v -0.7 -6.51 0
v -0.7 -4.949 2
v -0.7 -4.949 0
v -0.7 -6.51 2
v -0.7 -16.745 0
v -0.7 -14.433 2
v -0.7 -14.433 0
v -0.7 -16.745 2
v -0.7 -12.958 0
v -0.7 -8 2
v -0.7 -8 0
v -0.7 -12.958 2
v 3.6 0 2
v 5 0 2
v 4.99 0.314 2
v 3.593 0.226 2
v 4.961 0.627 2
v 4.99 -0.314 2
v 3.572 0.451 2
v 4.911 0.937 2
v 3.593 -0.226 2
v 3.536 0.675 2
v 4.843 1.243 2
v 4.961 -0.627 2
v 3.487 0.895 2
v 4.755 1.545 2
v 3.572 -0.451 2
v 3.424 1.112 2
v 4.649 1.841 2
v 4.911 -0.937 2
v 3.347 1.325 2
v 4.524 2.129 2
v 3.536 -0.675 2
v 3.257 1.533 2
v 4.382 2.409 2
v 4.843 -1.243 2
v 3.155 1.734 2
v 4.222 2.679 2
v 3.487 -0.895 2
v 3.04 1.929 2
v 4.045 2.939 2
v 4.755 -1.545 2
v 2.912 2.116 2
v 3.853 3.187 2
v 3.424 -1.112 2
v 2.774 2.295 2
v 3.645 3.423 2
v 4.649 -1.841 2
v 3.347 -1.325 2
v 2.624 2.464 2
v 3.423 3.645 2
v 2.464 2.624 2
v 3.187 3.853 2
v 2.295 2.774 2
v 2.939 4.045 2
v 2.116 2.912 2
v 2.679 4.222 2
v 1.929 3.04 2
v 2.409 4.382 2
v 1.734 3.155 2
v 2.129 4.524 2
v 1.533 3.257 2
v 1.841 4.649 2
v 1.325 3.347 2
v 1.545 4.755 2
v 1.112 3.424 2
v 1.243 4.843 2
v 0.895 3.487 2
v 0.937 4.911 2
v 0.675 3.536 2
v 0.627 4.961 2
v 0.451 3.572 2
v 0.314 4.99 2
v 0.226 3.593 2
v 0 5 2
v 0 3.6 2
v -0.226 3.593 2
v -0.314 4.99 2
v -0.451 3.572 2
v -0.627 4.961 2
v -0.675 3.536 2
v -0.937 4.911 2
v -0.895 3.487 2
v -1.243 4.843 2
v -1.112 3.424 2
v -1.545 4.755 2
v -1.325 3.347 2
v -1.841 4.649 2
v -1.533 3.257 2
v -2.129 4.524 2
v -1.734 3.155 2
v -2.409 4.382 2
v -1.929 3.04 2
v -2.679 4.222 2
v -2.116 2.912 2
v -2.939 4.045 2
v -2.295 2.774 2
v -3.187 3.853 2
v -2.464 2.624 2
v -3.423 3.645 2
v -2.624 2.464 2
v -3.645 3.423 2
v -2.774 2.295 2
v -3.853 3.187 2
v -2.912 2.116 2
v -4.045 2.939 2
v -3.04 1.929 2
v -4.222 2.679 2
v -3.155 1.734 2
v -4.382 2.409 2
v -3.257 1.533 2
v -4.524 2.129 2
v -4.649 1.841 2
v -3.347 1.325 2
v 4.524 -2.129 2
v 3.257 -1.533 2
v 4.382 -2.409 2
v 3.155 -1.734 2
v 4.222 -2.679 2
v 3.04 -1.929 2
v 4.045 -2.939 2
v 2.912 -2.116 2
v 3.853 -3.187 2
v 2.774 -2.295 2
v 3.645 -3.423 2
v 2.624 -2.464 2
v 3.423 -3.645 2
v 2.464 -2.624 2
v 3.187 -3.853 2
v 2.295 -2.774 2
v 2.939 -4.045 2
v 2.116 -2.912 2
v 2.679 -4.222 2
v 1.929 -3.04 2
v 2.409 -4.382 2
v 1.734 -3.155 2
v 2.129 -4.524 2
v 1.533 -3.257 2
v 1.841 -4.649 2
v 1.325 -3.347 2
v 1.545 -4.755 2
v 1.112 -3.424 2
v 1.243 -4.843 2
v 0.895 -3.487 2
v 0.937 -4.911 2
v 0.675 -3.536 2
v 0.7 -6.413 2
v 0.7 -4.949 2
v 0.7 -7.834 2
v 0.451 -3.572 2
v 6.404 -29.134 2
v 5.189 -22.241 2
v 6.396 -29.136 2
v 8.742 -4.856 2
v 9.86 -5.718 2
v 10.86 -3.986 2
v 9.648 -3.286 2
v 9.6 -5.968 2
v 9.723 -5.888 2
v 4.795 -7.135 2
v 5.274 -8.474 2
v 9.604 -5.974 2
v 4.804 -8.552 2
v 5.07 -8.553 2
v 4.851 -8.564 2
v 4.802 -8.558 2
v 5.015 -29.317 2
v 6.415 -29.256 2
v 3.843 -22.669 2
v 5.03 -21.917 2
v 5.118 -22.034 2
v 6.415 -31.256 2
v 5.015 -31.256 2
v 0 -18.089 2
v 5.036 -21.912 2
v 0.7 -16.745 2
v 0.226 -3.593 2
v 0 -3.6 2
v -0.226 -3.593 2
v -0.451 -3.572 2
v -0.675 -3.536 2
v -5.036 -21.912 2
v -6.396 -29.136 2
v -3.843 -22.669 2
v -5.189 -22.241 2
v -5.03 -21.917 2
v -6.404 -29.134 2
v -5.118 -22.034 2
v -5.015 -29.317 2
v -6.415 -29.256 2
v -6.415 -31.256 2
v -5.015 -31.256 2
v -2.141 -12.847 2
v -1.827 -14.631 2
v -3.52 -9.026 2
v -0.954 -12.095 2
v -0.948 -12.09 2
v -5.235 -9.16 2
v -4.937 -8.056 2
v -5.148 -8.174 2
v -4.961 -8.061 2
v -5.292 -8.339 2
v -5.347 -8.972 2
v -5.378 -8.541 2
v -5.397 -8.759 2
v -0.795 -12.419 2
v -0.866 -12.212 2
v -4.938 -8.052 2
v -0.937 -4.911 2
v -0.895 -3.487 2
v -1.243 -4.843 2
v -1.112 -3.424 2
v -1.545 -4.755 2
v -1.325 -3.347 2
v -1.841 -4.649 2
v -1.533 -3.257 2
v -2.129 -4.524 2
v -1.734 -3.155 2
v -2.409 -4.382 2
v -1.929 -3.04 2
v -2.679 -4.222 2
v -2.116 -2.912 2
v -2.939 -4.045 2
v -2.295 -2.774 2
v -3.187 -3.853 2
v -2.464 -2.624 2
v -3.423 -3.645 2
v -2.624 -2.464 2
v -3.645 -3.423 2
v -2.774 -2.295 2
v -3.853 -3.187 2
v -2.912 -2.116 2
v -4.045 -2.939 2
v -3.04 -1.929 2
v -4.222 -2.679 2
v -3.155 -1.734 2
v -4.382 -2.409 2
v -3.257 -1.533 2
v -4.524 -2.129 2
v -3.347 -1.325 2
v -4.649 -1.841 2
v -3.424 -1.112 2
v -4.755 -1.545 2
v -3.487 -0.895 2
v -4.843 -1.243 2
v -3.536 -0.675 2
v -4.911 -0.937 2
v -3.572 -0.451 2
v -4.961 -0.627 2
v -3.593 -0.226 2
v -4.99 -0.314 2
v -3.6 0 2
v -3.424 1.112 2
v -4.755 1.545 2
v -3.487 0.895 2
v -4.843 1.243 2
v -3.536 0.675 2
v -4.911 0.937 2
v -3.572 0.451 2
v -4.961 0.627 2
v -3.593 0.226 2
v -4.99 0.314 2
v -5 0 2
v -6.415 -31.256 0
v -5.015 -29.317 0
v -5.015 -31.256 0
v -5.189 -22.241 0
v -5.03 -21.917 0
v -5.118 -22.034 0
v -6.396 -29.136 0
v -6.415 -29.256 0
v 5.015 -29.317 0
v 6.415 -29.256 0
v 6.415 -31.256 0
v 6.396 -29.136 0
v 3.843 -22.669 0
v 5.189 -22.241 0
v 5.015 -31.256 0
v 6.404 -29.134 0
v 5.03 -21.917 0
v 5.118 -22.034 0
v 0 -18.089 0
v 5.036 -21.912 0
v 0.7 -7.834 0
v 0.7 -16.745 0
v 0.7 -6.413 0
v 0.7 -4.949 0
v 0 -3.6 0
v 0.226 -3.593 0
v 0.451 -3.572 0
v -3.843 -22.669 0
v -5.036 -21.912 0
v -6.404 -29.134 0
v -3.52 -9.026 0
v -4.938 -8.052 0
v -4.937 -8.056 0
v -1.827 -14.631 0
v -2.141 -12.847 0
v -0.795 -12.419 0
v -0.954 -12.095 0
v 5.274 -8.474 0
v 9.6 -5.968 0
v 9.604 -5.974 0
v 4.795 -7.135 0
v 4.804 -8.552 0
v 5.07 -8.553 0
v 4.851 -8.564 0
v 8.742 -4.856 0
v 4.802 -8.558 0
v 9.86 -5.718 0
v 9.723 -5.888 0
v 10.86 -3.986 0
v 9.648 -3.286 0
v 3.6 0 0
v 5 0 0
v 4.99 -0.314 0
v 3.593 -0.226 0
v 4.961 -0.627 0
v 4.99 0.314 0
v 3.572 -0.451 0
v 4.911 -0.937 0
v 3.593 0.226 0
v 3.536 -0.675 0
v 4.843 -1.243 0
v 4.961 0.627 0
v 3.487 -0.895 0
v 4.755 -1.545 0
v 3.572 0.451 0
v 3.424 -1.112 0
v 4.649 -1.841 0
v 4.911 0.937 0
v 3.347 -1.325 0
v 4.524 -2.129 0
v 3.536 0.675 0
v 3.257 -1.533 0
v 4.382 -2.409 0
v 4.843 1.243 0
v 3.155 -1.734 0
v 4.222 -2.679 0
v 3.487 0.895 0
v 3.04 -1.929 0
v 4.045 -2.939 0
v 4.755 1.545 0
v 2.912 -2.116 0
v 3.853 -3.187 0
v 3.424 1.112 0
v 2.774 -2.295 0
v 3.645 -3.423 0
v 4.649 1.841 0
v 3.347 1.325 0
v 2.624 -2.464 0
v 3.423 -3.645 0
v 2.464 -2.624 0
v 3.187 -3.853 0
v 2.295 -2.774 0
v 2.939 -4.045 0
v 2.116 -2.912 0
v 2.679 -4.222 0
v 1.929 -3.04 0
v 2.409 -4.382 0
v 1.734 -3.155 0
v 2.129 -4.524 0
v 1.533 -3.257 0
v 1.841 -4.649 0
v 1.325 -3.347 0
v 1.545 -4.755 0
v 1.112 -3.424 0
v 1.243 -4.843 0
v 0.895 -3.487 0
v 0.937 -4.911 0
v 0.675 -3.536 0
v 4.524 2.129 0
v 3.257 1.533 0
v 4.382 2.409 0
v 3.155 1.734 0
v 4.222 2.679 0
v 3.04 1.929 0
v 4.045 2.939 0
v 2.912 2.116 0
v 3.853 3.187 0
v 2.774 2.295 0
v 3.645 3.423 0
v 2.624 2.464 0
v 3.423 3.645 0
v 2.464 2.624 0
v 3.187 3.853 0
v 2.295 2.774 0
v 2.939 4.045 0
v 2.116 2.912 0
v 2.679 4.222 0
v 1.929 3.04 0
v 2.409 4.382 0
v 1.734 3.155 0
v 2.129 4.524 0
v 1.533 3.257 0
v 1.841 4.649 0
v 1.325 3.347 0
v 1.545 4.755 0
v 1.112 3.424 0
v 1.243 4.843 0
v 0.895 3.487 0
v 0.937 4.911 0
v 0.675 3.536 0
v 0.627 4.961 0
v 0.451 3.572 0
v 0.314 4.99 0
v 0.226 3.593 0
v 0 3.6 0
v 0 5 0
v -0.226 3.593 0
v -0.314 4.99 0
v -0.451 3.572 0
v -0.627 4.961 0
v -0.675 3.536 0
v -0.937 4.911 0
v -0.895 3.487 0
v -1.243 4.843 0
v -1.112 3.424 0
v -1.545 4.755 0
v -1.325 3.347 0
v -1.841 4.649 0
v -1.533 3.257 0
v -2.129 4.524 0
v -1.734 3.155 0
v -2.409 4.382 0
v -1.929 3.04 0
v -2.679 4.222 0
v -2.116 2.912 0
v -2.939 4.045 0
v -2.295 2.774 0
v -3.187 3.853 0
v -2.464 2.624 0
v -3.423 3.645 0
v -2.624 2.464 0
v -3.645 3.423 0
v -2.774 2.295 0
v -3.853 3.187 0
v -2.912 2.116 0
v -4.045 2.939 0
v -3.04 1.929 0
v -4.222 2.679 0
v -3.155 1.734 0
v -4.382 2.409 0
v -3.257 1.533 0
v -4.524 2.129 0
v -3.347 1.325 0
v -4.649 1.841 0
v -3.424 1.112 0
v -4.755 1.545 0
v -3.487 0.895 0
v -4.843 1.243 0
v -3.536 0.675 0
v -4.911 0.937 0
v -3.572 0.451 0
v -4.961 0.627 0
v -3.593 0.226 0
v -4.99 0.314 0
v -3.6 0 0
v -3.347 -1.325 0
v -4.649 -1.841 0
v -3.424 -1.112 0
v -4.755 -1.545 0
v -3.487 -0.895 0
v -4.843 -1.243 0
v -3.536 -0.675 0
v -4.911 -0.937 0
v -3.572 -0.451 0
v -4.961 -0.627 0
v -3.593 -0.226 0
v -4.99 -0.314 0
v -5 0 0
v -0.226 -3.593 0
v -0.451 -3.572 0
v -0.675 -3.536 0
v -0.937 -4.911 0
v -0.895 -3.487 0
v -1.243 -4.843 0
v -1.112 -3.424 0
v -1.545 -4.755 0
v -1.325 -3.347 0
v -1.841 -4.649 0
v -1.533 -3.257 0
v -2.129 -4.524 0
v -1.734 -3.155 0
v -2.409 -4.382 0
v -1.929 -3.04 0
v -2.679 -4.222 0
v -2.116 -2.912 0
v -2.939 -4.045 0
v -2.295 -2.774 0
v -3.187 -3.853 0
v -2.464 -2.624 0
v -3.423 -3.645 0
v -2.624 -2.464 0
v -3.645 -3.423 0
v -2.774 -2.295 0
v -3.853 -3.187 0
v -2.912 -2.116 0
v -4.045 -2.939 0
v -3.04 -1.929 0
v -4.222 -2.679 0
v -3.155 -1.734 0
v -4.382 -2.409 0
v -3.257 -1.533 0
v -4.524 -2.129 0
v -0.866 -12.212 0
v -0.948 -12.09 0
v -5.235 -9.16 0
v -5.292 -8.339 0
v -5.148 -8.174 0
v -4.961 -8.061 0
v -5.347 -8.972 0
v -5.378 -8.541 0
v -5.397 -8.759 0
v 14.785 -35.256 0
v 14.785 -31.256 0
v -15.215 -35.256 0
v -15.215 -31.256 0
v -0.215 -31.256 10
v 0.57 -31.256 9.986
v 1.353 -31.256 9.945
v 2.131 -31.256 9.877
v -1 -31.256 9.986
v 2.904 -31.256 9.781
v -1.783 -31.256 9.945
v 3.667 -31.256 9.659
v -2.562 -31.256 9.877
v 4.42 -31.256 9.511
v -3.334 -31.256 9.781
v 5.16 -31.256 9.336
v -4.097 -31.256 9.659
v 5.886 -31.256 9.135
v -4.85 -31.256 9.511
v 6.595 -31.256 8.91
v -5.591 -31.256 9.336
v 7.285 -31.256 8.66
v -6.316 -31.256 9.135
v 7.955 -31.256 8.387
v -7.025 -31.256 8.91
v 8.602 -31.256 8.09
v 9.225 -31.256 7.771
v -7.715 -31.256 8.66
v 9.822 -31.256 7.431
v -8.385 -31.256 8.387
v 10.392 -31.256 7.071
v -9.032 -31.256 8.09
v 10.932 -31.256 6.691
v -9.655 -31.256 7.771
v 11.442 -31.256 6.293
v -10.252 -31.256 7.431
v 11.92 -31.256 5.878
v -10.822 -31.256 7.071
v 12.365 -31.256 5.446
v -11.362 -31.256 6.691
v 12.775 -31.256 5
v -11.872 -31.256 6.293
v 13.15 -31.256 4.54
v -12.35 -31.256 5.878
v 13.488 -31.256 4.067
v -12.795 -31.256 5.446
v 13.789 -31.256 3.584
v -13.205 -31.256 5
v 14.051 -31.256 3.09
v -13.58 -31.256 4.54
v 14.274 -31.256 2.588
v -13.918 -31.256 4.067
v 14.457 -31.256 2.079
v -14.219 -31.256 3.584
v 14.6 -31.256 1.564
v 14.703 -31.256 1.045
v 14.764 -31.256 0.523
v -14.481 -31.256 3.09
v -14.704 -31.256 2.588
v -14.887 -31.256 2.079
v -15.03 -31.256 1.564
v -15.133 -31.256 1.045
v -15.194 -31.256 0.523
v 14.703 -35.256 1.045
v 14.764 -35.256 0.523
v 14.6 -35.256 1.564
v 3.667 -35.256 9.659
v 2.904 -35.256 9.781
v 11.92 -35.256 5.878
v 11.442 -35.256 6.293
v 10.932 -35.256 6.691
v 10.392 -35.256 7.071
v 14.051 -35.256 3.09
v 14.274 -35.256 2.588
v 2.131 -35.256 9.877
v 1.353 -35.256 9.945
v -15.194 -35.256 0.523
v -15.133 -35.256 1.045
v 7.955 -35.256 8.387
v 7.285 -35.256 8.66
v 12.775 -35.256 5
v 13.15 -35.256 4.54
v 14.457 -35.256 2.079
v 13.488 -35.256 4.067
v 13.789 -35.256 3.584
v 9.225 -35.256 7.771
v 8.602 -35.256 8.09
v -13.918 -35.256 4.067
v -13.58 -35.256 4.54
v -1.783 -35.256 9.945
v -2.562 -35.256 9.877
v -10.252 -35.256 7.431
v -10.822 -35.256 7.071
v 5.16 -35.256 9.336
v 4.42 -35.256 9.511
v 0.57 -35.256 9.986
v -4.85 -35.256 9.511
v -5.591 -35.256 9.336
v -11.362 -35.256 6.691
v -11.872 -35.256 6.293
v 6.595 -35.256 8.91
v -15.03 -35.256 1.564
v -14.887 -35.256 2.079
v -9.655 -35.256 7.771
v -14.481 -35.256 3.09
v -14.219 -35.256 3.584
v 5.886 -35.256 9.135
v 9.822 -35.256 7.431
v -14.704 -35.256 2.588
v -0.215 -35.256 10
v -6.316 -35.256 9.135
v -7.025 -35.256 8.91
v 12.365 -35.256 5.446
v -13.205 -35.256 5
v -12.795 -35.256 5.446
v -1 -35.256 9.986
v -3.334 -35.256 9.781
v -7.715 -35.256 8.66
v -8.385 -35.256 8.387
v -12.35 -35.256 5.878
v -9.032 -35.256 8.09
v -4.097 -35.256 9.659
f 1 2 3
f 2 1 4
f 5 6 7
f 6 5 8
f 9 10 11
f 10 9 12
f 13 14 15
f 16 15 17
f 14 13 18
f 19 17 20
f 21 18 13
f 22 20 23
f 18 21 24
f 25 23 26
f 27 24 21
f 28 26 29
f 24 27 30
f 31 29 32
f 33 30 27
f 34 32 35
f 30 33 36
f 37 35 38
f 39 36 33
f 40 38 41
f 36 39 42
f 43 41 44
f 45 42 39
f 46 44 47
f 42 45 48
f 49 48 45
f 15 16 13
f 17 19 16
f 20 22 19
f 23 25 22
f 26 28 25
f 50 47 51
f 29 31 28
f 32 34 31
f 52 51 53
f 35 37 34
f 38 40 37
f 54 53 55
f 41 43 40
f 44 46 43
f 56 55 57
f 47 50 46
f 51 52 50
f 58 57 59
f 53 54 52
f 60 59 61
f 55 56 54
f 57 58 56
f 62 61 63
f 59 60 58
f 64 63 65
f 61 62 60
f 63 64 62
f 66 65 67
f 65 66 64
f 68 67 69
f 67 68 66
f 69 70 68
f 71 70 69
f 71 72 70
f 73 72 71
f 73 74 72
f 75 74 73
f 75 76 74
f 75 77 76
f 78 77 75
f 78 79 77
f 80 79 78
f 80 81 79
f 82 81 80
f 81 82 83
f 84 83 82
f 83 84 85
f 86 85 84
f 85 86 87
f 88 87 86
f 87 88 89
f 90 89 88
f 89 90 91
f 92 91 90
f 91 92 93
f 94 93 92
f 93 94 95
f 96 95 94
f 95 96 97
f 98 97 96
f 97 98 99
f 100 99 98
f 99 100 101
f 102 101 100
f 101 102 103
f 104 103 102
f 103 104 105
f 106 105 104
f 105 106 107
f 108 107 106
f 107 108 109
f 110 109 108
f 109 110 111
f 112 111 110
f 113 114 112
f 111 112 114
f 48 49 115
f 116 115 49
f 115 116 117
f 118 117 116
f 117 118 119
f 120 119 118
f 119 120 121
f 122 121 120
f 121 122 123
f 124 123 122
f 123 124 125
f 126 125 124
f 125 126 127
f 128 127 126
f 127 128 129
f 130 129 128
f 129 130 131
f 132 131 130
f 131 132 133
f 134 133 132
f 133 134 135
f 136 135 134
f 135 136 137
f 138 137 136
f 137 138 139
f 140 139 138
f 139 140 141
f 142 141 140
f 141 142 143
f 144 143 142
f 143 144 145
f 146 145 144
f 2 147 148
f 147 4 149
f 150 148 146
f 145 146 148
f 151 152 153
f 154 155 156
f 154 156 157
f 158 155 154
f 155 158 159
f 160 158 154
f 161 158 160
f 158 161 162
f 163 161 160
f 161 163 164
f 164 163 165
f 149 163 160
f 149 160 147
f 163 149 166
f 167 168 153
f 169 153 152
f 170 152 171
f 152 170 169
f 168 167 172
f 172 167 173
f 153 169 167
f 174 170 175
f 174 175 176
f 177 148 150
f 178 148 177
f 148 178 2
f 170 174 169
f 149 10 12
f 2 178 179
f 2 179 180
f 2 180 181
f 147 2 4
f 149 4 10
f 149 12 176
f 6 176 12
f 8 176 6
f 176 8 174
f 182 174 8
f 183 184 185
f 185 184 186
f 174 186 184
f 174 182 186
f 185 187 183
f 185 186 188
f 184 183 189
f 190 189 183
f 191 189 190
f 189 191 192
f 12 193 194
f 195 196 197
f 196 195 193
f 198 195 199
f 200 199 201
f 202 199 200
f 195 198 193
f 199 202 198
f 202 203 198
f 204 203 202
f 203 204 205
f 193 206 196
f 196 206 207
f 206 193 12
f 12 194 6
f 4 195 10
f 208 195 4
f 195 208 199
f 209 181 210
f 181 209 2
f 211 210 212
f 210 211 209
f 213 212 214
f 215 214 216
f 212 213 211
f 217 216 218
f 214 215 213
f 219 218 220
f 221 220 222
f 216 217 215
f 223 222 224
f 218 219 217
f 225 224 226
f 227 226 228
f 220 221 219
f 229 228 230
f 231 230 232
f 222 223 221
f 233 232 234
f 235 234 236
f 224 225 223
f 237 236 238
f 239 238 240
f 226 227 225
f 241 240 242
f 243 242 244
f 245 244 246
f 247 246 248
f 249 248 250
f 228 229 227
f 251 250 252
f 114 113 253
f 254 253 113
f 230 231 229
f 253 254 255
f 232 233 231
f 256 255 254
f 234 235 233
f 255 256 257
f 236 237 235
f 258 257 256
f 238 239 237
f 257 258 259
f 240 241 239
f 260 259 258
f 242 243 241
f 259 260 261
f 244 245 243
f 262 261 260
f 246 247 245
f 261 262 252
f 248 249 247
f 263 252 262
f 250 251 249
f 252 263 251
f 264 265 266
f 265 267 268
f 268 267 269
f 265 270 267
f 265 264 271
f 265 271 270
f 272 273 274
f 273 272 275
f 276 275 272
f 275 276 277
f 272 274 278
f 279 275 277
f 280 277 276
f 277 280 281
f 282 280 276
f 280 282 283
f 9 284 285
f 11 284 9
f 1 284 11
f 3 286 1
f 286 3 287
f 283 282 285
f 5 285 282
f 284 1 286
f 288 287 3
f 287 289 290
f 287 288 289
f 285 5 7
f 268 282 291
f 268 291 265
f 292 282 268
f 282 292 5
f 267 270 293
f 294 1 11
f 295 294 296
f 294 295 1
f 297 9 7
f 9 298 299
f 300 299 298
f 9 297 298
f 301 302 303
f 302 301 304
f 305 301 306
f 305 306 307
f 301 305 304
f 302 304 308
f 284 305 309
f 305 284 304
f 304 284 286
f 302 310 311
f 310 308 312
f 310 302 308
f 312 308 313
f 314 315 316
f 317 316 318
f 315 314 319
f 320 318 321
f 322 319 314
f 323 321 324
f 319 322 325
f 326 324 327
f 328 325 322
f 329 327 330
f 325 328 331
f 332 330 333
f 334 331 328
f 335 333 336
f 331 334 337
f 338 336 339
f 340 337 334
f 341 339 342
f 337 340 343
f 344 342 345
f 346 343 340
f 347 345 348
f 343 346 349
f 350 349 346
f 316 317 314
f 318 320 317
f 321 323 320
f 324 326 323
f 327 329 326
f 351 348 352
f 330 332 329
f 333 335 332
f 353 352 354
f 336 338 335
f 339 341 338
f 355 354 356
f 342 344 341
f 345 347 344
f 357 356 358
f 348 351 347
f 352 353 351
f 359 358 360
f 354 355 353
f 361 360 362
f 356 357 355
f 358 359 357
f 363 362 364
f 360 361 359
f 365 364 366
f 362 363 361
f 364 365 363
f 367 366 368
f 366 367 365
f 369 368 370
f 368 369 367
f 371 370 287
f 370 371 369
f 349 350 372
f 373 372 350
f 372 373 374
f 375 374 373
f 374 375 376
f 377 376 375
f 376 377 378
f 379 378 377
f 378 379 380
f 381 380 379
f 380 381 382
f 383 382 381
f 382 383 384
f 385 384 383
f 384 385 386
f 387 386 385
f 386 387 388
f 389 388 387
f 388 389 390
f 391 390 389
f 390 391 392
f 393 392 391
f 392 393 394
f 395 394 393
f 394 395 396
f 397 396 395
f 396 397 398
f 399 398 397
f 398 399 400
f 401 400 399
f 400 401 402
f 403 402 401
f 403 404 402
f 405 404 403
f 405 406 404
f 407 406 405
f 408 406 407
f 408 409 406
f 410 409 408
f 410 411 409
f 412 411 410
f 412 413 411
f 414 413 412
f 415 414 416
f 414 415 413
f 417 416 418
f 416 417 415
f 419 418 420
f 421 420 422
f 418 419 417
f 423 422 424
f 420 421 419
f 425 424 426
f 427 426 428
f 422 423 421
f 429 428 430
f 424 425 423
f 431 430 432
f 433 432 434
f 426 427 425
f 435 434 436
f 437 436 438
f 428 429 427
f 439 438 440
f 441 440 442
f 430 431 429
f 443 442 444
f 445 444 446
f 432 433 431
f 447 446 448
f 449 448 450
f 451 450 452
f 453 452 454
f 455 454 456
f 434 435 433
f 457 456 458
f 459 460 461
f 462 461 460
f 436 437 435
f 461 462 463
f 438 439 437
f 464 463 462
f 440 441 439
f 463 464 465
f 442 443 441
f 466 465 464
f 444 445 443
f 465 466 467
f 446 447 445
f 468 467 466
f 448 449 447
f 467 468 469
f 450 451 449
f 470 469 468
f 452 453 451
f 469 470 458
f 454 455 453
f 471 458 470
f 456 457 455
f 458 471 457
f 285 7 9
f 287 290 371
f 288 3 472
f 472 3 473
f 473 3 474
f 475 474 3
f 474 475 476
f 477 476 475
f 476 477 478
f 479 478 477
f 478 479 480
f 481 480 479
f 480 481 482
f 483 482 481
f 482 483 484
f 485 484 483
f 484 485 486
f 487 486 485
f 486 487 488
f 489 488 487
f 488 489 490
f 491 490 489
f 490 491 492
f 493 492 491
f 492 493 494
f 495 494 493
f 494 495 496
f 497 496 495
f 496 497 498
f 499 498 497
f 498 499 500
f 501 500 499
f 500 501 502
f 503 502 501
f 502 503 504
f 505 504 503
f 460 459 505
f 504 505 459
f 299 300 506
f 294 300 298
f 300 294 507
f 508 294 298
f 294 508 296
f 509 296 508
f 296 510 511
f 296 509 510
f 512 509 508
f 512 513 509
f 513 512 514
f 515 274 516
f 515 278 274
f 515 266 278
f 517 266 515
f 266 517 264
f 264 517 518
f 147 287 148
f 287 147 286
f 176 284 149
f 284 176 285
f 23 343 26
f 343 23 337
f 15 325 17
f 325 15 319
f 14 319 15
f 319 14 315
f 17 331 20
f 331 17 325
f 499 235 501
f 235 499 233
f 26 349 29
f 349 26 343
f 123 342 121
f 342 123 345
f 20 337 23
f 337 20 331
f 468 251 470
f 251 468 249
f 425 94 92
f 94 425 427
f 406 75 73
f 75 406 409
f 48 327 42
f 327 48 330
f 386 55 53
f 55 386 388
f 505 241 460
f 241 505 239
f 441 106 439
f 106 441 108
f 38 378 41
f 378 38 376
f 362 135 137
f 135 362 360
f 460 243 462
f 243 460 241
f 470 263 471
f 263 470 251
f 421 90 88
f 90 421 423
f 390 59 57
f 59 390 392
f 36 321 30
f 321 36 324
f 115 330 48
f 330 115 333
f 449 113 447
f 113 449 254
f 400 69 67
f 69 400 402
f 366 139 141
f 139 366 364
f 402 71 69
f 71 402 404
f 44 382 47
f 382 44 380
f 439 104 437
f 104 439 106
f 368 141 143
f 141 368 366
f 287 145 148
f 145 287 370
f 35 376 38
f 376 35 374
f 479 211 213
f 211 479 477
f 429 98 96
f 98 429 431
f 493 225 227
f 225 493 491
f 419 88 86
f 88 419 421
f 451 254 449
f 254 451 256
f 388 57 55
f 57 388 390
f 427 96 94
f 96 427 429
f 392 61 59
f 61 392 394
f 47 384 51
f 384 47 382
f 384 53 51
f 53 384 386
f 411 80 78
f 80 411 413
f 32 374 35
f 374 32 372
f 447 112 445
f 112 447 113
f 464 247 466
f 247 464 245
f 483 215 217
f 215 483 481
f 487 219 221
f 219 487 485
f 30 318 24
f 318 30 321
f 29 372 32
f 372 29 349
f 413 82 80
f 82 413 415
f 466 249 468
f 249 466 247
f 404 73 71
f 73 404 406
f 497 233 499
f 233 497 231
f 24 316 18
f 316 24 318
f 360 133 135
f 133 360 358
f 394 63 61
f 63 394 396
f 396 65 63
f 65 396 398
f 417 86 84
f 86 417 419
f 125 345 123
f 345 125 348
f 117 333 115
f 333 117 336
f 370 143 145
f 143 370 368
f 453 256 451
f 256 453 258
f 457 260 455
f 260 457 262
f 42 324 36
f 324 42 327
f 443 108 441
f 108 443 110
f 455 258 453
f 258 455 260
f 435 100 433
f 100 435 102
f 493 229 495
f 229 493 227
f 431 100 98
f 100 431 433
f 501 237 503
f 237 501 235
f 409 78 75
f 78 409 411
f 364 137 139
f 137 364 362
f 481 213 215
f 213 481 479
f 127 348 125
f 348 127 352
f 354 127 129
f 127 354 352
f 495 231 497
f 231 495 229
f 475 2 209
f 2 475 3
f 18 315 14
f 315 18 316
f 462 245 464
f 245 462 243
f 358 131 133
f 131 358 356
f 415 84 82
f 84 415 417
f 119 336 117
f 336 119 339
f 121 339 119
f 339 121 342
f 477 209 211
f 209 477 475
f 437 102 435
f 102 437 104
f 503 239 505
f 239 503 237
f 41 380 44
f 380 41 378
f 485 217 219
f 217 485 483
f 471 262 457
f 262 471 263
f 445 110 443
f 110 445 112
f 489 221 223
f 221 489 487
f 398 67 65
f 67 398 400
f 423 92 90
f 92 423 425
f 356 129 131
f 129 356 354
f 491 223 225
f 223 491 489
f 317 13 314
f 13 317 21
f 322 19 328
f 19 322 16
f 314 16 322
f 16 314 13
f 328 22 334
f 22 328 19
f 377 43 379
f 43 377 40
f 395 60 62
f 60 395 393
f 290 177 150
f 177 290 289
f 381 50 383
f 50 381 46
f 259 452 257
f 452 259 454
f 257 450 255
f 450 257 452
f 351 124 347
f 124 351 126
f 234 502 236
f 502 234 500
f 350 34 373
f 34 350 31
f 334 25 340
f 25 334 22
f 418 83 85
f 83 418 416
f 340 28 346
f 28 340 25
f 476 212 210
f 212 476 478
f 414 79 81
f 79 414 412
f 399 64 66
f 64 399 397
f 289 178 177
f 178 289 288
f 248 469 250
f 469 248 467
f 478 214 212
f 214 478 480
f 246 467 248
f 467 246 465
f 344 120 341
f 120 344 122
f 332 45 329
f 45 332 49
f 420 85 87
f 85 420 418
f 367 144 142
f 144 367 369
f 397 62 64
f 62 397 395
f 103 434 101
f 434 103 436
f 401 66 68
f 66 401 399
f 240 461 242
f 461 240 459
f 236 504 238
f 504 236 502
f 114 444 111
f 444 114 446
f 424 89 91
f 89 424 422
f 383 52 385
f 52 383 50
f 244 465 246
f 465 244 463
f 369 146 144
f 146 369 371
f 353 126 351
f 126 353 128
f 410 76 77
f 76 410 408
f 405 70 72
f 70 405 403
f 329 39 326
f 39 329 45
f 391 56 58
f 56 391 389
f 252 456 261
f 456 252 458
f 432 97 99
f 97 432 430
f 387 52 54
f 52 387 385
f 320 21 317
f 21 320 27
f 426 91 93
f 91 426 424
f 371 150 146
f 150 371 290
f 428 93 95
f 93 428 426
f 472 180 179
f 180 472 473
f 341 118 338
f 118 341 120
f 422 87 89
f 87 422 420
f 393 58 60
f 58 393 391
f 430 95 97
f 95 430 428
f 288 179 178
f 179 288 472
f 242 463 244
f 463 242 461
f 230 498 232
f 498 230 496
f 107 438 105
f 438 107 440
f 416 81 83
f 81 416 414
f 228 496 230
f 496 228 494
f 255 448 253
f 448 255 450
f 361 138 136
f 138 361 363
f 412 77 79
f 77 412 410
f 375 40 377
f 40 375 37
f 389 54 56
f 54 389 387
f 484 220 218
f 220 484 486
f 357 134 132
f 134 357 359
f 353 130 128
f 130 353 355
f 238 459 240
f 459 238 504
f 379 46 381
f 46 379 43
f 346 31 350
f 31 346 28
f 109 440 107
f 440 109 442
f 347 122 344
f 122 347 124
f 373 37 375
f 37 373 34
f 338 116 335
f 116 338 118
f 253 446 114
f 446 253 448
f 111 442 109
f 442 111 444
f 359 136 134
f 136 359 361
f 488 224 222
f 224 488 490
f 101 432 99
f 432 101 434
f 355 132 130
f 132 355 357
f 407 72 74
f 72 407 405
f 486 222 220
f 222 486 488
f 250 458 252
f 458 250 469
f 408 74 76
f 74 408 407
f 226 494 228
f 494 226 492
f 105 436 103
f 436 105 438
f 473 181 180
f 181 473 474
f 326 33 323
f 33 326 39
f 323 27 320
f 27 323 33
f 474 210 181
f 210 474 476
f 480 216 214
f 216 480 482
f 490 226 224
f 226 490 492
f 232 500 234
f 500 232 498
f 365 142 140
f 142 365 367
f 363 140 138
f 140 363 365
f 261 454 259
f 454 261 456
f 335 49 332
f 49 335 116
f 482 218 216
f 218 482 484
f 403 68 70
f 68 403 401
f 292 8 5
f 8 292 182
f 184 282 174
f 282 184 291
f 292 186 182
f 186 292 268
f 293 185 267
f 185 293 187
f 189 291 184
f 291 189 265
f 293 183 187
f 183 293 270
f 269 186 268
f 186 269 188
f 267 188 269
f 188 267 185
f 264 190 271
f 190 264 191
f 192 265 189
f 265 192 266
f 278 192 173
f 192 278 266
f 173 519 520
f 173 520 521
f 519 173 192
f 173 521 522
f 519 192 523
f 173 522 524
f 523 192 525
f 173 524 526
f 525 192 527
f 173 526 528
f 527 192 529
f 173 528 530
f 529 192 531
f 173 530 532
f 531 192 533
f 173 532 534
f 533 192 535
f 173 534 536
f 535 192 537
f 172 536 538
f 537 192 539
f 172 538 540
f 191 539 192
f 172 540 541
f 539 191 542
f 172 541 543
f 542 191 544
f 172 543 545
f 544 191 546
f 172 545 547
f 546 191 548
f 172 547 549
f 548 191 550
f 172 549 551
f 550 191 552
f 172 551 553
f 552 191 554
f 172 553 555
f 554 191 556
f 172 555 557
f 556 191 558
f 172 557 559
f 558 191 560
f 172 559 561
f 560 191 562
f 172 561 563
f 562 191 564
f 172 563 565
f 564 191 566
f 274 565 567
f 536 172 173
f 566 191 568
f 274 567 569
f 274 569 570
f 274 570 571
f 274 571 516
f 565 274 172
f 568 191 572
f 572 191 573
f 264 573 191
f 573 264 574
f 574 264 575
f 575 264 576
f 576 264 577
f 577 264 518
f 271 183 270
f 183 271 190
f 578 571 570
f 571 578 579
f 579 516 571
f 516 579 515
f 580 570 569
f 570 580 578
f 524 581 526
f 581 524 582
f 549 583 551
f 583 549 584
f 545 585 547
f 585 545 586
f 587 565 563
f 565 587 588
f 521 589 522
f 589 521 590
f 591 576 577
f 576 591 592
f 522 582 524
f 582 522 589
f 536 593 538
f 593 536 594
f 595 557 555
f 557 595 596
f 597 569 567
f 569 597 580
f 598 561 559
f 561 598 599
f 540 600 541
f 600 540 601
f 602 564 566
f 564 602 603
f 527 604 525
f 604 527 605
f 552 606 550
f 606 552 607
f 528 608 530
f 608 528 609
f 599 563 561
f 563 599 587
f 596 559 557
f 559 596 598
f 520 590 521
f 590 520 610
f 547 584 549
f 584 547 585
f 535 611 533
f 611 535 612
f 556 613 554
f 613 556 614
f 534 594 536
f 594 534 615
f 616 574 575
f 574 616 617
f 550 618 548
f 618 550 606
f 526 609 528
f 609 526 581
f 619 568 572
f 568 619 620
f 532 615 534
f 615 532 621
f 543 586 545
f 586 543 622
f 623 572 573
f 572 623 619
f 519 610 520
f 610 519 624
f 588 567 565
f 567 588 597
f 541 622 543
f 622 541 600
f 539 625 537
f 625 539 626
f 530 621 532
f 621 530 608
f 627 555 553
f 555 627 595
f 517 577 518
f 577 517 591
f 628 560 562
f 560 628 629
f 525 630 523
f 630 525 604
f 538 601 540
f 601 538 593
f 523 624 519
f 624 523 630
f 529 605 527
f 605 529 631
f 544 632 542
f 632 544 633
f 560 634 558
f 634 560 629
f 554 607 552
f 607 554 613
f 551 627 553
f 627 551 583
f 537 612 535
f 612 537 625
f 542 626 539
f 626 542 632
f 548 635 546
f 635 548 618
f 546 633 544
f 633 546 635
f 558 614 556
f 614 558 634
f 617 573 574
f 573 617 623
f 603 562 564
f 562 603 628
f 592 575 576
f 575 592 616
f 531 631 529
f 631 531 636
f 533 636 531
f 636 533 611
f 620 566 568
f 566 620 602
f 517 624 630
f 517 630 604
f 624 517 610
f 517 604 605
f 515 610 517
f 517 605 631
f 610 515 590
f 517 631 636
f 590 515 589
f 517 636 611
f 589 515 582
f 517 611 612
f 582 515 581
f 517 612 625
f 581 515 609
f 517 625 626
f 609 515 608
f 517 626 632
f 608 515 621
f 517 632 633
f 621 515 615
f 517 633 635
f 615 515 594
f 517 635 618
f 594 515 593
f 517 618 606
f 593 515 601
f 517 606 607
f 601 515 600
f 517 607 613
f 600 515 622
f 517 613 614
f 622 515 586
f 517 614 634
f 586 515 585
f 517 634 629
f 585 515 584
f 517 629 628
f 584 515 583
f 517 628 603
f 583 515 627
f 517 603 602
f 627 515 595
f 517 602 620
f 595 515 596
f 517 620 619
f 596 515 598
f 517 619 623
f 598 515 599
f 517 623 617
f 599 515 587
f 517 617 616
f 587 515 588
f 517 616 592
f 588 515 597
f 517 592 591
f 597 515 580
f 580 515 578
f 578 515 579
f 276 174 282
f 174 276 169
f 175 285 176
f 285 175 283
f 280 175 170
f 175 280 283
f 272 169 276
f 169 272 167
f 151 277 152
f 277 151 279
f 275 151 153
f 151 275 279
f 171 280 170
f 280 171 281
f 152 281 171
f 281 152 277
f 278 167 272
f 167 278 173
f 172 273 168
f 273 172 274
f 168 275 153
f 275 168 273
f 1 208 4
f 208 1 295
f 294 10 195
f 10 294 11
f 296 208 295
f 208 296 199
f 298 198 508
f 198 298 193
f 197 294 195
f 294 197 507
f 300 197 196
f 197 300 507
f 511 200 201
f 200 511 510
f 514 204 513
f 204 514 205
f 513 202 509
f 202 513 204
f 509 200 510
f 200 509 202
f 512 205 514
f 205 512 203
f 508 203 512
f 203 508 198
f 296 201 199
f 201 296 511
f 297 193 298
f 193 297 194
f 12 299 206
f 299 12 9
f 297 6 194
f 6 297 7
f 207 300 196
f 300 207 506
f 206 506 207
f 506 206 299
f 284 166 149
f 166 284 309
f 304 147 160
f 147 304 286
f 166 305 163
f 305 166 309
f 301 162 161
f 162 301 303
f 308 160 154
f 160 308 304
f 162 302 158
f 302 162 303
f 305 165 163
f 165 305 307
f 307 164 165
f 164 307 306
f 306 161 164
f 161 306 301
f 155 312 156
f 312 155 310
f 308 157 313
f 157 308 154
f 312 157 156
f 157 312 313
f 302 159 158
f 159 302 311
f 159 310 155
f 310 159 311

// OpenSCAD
// ==================================================
// Stick Man - Customizer
// Created by Daiju Watanbe ( Daizyu ).
// 2 April 2016. 
// =================================================

// preview[view:south, tilt:top]

/* [Angle] */
upper_arm_l = -70;               // [-360:360]
lower_arm_l = 110;               // [-360:360]
hand_l = -30;               // [-360:360]
upper_arm_r = 80;               // [-360:360]
lower_arm_r = 40;               // [-360:360]
hand_r = 30;               // [-360:360]
thigh_l = -40;               // [-360:360]
shin_l = 30;               // [-360:360]
foot_l = 10;               // [-360:360]
thigh_r = 40;               // [-360:360]
shin_r = -30;               // [-360:360]
foot_r = -10;               // [-360:360]
body = 0;               // [-360:360]

/* [Base] */
base_position = 1; // [0:None,1:Left Leg,1:Right Leg,2:Left Arm,3:Right Arm] */
base_type=3;	// [1:Circle,2:Front circle,3:Back circle,4:Cube,5:Front cube,6:Back cube */
base_width = 15;
base_depth = 5;
base_height = 2;
base_rotate = 0;
base_offset_x = 5.5;
base_offset_y = 0;

/* [Basic] */
b_thickness = 2;
thickness = 1.4;

/* [Head] */
fill_head = false;
head_diameter = 10;
head_offset_x = 0;
head_offset_y = 0;

/* [Body] */
body_length = 12;

/* [Left arm] */
arm_l_offset = 2;
upper_arm_l_length = 5;
lower_arm_l_length = 5;
hand_l_length = 2;

/* [Right arm] */
arm_r_offset = 2;
upper_arm_r_length = 5;
lower_arm_r_length = 5;
hand_r_length = 2;

/* [Left Leg] */
thigh_l_length = 7;
shin_l_length = 7;
foot_l_length = 2;

/* [Right Leg] */
thigh_r_length = 7;
shin_r_length = 7;
foot_r_length = 2;

/* [resolution] */
base_fn = 120;
head_fn = 100;

module bone(length){
{
	translate([-thickness/2,0,0])
		cube(size = [thickness,length,b_thickness], center = false);
	}
	cylinder(h=b_thickness, r=thickness/2, center=false ,$fn=20);
}

module base(){
	if(base_type==0)
	{

	}
	if(base_type==1)
	{
		translate([0,0,b_thickness/2])
		rotate(90,[1,0,0])
		scale([base_width,base_depth,base_height])
		cylinder(h=base_height, r=1, center=false ,$fn=base_fn);
	}
	if(base_type==2)
	{
		translate([0,0,b_thickness])
		//translate([0,0,-base_height-b_thickness/2])
		rotate(90,[1,0,0])
		scale([base_width,base_depth*2,base_height])
		difference() 
		{
			cylinder(h=base_height, r=1, center=false ,$fn=base_fn);
			translate([-1,0 ,-1 ])
			cube([2,2 ,base_height+2 ], center = false);
		}
	}
	if(base_type==3)
	{
		translate([0,0,0])
		//translate([0,0,-base_height-b_thickness/2])
		rotate(90,[1,0,0])
		scale([base_width,base_depth*2,base_height])
		difference() 
		{
			cylinder(h=base_height, r=1, center=false ,$fn=base_fn);
			translate([-1,-2,-1])
			cube([2,2 ,base_height+2 ], center = false);
		}
	}
	if(base_type==4)
	{
		translate([0,0,b_thickness/2])
		//translate([0,0,-base_height-b_thickness/2])
		rotate(90,[1,0,0])
		scale([base_width,base_depth*2,base_height])
		difference() 
		{
			//cylinder(h=base_height, r=1, center=false ,$fn=base_fn);
			//cube([2,2 ,base_height+2 ], center = false);
			translate([-0.5,-0.5 ,0 ])
			cube([1,1 ,1 ], center = false);
		}
	}
	if(base_type==5)
	{
		translate([0,0,b_thickness])
		//translate([0,0,-base_height-b_thickness/2])
		rotate(90,[1,0,0])
		scale([base_width,base_depth*2,base_height])
		difference() 
		{
			//cylinder(h=base_height, r=1, center=false ,$fn=base_fn);
			//cube([2,2 ,base_height+2 ], center = false);
			translate([-0.5,-1.0 ,0 ])
			cube([1,1 ,1 ], center = false);
		}
	}
	if(base_type==6)
	{
		translate([0,0,0])
		//translate([0,0,-base_height-b_thickness/2])
		rotate(90,[1,0,0])
		scale([base_width,base_depth*2,base_height])
		difference() 
		{
			//cylinder(h=base_height, r=1, center=false ,$fn=base_fn);
			//cube([2,2 ,base_height+2 ], center = false);
			translate([-0.5,0 ,0 ])
			cube([1,1 ,1 ], center = false);
		}
	}
}


module branch(
	head_diameter,
	Degrees1,Length1,
	Degrees2,length2,
	Degrees3,length3,
	Degrees4,length4,
	BasePosition)
{
	rotate(Degrees1,[0,0,1])
	translate([0,Length1+head_diameter/2,0])
	rotate(Degrees2,[0,0,1])
	{
		bone(length2);

		translate([0,length2,0])
		rotate(Degrees3,[0,0,1])
		{
			bone(length3);

			translate([0,length3,0])
			rotate(Degrees4,[0,0,1])
			{
				bone(length4);

				if ( base_position == BasePosition ) 
				{
					translate([0,length4,0])
						rotate(-Degrees2-Degrees3
						-Degrees4-Degrees1+base_rotate,[0,0,1])
						translate([base_offset_x,base_offset_y,0])
						base();
						//cube([1,1,1]);
				}
			}
		}
	}
}

module headBody()
{
    	union(){
		translate([head_offset_x,head_offset_y,0])
			cylinder(h=b_thickness, r=head_diameter/2.0, center=false ,$fn=head_fn);
		rotate(body+180,[0,0,1])
			bone(body_length+head_diameter/2);	
	}
}

union()
{
	if ( fill_head ) 
	{
		headBody();
	}else{
		difference()
		{
			headBody();
			translate([head_offset_x,head_offset_y,-1])
				cylinder(h=b_thickness+2, r=(head_diameter)/2.0-thickness, center=false ,$fn=head_fn);
		}
	}

	branch(head_diameter,
		body+180,body_length,
		thigh_l,thigh_l_length,
		shin_l,shin_l_length,
		foot_l,foot_l_length,
		1);

	branch(head_diameter,
		body+180,body_length,
		thigh_r,thigh_r_length,
		shin_r,shin_r_length,
		foot_r,foot_r_length,
		2);

	branch(head_diameter,
		body+180,arm_l_offset,
		upper_arm_l,upper_arm_l_length,
		lower_arm_l,lower_arm_l_length,
		hand_l,hand_l_length,
		3);

	branch(head_diameter,
		body+180,arm_r_offset,
		upper_arm_r,upper_arm_r_length,
		lower_arm_r,lower_arm_r_length,
		hand_r,hand_r_length,
		4);
}
